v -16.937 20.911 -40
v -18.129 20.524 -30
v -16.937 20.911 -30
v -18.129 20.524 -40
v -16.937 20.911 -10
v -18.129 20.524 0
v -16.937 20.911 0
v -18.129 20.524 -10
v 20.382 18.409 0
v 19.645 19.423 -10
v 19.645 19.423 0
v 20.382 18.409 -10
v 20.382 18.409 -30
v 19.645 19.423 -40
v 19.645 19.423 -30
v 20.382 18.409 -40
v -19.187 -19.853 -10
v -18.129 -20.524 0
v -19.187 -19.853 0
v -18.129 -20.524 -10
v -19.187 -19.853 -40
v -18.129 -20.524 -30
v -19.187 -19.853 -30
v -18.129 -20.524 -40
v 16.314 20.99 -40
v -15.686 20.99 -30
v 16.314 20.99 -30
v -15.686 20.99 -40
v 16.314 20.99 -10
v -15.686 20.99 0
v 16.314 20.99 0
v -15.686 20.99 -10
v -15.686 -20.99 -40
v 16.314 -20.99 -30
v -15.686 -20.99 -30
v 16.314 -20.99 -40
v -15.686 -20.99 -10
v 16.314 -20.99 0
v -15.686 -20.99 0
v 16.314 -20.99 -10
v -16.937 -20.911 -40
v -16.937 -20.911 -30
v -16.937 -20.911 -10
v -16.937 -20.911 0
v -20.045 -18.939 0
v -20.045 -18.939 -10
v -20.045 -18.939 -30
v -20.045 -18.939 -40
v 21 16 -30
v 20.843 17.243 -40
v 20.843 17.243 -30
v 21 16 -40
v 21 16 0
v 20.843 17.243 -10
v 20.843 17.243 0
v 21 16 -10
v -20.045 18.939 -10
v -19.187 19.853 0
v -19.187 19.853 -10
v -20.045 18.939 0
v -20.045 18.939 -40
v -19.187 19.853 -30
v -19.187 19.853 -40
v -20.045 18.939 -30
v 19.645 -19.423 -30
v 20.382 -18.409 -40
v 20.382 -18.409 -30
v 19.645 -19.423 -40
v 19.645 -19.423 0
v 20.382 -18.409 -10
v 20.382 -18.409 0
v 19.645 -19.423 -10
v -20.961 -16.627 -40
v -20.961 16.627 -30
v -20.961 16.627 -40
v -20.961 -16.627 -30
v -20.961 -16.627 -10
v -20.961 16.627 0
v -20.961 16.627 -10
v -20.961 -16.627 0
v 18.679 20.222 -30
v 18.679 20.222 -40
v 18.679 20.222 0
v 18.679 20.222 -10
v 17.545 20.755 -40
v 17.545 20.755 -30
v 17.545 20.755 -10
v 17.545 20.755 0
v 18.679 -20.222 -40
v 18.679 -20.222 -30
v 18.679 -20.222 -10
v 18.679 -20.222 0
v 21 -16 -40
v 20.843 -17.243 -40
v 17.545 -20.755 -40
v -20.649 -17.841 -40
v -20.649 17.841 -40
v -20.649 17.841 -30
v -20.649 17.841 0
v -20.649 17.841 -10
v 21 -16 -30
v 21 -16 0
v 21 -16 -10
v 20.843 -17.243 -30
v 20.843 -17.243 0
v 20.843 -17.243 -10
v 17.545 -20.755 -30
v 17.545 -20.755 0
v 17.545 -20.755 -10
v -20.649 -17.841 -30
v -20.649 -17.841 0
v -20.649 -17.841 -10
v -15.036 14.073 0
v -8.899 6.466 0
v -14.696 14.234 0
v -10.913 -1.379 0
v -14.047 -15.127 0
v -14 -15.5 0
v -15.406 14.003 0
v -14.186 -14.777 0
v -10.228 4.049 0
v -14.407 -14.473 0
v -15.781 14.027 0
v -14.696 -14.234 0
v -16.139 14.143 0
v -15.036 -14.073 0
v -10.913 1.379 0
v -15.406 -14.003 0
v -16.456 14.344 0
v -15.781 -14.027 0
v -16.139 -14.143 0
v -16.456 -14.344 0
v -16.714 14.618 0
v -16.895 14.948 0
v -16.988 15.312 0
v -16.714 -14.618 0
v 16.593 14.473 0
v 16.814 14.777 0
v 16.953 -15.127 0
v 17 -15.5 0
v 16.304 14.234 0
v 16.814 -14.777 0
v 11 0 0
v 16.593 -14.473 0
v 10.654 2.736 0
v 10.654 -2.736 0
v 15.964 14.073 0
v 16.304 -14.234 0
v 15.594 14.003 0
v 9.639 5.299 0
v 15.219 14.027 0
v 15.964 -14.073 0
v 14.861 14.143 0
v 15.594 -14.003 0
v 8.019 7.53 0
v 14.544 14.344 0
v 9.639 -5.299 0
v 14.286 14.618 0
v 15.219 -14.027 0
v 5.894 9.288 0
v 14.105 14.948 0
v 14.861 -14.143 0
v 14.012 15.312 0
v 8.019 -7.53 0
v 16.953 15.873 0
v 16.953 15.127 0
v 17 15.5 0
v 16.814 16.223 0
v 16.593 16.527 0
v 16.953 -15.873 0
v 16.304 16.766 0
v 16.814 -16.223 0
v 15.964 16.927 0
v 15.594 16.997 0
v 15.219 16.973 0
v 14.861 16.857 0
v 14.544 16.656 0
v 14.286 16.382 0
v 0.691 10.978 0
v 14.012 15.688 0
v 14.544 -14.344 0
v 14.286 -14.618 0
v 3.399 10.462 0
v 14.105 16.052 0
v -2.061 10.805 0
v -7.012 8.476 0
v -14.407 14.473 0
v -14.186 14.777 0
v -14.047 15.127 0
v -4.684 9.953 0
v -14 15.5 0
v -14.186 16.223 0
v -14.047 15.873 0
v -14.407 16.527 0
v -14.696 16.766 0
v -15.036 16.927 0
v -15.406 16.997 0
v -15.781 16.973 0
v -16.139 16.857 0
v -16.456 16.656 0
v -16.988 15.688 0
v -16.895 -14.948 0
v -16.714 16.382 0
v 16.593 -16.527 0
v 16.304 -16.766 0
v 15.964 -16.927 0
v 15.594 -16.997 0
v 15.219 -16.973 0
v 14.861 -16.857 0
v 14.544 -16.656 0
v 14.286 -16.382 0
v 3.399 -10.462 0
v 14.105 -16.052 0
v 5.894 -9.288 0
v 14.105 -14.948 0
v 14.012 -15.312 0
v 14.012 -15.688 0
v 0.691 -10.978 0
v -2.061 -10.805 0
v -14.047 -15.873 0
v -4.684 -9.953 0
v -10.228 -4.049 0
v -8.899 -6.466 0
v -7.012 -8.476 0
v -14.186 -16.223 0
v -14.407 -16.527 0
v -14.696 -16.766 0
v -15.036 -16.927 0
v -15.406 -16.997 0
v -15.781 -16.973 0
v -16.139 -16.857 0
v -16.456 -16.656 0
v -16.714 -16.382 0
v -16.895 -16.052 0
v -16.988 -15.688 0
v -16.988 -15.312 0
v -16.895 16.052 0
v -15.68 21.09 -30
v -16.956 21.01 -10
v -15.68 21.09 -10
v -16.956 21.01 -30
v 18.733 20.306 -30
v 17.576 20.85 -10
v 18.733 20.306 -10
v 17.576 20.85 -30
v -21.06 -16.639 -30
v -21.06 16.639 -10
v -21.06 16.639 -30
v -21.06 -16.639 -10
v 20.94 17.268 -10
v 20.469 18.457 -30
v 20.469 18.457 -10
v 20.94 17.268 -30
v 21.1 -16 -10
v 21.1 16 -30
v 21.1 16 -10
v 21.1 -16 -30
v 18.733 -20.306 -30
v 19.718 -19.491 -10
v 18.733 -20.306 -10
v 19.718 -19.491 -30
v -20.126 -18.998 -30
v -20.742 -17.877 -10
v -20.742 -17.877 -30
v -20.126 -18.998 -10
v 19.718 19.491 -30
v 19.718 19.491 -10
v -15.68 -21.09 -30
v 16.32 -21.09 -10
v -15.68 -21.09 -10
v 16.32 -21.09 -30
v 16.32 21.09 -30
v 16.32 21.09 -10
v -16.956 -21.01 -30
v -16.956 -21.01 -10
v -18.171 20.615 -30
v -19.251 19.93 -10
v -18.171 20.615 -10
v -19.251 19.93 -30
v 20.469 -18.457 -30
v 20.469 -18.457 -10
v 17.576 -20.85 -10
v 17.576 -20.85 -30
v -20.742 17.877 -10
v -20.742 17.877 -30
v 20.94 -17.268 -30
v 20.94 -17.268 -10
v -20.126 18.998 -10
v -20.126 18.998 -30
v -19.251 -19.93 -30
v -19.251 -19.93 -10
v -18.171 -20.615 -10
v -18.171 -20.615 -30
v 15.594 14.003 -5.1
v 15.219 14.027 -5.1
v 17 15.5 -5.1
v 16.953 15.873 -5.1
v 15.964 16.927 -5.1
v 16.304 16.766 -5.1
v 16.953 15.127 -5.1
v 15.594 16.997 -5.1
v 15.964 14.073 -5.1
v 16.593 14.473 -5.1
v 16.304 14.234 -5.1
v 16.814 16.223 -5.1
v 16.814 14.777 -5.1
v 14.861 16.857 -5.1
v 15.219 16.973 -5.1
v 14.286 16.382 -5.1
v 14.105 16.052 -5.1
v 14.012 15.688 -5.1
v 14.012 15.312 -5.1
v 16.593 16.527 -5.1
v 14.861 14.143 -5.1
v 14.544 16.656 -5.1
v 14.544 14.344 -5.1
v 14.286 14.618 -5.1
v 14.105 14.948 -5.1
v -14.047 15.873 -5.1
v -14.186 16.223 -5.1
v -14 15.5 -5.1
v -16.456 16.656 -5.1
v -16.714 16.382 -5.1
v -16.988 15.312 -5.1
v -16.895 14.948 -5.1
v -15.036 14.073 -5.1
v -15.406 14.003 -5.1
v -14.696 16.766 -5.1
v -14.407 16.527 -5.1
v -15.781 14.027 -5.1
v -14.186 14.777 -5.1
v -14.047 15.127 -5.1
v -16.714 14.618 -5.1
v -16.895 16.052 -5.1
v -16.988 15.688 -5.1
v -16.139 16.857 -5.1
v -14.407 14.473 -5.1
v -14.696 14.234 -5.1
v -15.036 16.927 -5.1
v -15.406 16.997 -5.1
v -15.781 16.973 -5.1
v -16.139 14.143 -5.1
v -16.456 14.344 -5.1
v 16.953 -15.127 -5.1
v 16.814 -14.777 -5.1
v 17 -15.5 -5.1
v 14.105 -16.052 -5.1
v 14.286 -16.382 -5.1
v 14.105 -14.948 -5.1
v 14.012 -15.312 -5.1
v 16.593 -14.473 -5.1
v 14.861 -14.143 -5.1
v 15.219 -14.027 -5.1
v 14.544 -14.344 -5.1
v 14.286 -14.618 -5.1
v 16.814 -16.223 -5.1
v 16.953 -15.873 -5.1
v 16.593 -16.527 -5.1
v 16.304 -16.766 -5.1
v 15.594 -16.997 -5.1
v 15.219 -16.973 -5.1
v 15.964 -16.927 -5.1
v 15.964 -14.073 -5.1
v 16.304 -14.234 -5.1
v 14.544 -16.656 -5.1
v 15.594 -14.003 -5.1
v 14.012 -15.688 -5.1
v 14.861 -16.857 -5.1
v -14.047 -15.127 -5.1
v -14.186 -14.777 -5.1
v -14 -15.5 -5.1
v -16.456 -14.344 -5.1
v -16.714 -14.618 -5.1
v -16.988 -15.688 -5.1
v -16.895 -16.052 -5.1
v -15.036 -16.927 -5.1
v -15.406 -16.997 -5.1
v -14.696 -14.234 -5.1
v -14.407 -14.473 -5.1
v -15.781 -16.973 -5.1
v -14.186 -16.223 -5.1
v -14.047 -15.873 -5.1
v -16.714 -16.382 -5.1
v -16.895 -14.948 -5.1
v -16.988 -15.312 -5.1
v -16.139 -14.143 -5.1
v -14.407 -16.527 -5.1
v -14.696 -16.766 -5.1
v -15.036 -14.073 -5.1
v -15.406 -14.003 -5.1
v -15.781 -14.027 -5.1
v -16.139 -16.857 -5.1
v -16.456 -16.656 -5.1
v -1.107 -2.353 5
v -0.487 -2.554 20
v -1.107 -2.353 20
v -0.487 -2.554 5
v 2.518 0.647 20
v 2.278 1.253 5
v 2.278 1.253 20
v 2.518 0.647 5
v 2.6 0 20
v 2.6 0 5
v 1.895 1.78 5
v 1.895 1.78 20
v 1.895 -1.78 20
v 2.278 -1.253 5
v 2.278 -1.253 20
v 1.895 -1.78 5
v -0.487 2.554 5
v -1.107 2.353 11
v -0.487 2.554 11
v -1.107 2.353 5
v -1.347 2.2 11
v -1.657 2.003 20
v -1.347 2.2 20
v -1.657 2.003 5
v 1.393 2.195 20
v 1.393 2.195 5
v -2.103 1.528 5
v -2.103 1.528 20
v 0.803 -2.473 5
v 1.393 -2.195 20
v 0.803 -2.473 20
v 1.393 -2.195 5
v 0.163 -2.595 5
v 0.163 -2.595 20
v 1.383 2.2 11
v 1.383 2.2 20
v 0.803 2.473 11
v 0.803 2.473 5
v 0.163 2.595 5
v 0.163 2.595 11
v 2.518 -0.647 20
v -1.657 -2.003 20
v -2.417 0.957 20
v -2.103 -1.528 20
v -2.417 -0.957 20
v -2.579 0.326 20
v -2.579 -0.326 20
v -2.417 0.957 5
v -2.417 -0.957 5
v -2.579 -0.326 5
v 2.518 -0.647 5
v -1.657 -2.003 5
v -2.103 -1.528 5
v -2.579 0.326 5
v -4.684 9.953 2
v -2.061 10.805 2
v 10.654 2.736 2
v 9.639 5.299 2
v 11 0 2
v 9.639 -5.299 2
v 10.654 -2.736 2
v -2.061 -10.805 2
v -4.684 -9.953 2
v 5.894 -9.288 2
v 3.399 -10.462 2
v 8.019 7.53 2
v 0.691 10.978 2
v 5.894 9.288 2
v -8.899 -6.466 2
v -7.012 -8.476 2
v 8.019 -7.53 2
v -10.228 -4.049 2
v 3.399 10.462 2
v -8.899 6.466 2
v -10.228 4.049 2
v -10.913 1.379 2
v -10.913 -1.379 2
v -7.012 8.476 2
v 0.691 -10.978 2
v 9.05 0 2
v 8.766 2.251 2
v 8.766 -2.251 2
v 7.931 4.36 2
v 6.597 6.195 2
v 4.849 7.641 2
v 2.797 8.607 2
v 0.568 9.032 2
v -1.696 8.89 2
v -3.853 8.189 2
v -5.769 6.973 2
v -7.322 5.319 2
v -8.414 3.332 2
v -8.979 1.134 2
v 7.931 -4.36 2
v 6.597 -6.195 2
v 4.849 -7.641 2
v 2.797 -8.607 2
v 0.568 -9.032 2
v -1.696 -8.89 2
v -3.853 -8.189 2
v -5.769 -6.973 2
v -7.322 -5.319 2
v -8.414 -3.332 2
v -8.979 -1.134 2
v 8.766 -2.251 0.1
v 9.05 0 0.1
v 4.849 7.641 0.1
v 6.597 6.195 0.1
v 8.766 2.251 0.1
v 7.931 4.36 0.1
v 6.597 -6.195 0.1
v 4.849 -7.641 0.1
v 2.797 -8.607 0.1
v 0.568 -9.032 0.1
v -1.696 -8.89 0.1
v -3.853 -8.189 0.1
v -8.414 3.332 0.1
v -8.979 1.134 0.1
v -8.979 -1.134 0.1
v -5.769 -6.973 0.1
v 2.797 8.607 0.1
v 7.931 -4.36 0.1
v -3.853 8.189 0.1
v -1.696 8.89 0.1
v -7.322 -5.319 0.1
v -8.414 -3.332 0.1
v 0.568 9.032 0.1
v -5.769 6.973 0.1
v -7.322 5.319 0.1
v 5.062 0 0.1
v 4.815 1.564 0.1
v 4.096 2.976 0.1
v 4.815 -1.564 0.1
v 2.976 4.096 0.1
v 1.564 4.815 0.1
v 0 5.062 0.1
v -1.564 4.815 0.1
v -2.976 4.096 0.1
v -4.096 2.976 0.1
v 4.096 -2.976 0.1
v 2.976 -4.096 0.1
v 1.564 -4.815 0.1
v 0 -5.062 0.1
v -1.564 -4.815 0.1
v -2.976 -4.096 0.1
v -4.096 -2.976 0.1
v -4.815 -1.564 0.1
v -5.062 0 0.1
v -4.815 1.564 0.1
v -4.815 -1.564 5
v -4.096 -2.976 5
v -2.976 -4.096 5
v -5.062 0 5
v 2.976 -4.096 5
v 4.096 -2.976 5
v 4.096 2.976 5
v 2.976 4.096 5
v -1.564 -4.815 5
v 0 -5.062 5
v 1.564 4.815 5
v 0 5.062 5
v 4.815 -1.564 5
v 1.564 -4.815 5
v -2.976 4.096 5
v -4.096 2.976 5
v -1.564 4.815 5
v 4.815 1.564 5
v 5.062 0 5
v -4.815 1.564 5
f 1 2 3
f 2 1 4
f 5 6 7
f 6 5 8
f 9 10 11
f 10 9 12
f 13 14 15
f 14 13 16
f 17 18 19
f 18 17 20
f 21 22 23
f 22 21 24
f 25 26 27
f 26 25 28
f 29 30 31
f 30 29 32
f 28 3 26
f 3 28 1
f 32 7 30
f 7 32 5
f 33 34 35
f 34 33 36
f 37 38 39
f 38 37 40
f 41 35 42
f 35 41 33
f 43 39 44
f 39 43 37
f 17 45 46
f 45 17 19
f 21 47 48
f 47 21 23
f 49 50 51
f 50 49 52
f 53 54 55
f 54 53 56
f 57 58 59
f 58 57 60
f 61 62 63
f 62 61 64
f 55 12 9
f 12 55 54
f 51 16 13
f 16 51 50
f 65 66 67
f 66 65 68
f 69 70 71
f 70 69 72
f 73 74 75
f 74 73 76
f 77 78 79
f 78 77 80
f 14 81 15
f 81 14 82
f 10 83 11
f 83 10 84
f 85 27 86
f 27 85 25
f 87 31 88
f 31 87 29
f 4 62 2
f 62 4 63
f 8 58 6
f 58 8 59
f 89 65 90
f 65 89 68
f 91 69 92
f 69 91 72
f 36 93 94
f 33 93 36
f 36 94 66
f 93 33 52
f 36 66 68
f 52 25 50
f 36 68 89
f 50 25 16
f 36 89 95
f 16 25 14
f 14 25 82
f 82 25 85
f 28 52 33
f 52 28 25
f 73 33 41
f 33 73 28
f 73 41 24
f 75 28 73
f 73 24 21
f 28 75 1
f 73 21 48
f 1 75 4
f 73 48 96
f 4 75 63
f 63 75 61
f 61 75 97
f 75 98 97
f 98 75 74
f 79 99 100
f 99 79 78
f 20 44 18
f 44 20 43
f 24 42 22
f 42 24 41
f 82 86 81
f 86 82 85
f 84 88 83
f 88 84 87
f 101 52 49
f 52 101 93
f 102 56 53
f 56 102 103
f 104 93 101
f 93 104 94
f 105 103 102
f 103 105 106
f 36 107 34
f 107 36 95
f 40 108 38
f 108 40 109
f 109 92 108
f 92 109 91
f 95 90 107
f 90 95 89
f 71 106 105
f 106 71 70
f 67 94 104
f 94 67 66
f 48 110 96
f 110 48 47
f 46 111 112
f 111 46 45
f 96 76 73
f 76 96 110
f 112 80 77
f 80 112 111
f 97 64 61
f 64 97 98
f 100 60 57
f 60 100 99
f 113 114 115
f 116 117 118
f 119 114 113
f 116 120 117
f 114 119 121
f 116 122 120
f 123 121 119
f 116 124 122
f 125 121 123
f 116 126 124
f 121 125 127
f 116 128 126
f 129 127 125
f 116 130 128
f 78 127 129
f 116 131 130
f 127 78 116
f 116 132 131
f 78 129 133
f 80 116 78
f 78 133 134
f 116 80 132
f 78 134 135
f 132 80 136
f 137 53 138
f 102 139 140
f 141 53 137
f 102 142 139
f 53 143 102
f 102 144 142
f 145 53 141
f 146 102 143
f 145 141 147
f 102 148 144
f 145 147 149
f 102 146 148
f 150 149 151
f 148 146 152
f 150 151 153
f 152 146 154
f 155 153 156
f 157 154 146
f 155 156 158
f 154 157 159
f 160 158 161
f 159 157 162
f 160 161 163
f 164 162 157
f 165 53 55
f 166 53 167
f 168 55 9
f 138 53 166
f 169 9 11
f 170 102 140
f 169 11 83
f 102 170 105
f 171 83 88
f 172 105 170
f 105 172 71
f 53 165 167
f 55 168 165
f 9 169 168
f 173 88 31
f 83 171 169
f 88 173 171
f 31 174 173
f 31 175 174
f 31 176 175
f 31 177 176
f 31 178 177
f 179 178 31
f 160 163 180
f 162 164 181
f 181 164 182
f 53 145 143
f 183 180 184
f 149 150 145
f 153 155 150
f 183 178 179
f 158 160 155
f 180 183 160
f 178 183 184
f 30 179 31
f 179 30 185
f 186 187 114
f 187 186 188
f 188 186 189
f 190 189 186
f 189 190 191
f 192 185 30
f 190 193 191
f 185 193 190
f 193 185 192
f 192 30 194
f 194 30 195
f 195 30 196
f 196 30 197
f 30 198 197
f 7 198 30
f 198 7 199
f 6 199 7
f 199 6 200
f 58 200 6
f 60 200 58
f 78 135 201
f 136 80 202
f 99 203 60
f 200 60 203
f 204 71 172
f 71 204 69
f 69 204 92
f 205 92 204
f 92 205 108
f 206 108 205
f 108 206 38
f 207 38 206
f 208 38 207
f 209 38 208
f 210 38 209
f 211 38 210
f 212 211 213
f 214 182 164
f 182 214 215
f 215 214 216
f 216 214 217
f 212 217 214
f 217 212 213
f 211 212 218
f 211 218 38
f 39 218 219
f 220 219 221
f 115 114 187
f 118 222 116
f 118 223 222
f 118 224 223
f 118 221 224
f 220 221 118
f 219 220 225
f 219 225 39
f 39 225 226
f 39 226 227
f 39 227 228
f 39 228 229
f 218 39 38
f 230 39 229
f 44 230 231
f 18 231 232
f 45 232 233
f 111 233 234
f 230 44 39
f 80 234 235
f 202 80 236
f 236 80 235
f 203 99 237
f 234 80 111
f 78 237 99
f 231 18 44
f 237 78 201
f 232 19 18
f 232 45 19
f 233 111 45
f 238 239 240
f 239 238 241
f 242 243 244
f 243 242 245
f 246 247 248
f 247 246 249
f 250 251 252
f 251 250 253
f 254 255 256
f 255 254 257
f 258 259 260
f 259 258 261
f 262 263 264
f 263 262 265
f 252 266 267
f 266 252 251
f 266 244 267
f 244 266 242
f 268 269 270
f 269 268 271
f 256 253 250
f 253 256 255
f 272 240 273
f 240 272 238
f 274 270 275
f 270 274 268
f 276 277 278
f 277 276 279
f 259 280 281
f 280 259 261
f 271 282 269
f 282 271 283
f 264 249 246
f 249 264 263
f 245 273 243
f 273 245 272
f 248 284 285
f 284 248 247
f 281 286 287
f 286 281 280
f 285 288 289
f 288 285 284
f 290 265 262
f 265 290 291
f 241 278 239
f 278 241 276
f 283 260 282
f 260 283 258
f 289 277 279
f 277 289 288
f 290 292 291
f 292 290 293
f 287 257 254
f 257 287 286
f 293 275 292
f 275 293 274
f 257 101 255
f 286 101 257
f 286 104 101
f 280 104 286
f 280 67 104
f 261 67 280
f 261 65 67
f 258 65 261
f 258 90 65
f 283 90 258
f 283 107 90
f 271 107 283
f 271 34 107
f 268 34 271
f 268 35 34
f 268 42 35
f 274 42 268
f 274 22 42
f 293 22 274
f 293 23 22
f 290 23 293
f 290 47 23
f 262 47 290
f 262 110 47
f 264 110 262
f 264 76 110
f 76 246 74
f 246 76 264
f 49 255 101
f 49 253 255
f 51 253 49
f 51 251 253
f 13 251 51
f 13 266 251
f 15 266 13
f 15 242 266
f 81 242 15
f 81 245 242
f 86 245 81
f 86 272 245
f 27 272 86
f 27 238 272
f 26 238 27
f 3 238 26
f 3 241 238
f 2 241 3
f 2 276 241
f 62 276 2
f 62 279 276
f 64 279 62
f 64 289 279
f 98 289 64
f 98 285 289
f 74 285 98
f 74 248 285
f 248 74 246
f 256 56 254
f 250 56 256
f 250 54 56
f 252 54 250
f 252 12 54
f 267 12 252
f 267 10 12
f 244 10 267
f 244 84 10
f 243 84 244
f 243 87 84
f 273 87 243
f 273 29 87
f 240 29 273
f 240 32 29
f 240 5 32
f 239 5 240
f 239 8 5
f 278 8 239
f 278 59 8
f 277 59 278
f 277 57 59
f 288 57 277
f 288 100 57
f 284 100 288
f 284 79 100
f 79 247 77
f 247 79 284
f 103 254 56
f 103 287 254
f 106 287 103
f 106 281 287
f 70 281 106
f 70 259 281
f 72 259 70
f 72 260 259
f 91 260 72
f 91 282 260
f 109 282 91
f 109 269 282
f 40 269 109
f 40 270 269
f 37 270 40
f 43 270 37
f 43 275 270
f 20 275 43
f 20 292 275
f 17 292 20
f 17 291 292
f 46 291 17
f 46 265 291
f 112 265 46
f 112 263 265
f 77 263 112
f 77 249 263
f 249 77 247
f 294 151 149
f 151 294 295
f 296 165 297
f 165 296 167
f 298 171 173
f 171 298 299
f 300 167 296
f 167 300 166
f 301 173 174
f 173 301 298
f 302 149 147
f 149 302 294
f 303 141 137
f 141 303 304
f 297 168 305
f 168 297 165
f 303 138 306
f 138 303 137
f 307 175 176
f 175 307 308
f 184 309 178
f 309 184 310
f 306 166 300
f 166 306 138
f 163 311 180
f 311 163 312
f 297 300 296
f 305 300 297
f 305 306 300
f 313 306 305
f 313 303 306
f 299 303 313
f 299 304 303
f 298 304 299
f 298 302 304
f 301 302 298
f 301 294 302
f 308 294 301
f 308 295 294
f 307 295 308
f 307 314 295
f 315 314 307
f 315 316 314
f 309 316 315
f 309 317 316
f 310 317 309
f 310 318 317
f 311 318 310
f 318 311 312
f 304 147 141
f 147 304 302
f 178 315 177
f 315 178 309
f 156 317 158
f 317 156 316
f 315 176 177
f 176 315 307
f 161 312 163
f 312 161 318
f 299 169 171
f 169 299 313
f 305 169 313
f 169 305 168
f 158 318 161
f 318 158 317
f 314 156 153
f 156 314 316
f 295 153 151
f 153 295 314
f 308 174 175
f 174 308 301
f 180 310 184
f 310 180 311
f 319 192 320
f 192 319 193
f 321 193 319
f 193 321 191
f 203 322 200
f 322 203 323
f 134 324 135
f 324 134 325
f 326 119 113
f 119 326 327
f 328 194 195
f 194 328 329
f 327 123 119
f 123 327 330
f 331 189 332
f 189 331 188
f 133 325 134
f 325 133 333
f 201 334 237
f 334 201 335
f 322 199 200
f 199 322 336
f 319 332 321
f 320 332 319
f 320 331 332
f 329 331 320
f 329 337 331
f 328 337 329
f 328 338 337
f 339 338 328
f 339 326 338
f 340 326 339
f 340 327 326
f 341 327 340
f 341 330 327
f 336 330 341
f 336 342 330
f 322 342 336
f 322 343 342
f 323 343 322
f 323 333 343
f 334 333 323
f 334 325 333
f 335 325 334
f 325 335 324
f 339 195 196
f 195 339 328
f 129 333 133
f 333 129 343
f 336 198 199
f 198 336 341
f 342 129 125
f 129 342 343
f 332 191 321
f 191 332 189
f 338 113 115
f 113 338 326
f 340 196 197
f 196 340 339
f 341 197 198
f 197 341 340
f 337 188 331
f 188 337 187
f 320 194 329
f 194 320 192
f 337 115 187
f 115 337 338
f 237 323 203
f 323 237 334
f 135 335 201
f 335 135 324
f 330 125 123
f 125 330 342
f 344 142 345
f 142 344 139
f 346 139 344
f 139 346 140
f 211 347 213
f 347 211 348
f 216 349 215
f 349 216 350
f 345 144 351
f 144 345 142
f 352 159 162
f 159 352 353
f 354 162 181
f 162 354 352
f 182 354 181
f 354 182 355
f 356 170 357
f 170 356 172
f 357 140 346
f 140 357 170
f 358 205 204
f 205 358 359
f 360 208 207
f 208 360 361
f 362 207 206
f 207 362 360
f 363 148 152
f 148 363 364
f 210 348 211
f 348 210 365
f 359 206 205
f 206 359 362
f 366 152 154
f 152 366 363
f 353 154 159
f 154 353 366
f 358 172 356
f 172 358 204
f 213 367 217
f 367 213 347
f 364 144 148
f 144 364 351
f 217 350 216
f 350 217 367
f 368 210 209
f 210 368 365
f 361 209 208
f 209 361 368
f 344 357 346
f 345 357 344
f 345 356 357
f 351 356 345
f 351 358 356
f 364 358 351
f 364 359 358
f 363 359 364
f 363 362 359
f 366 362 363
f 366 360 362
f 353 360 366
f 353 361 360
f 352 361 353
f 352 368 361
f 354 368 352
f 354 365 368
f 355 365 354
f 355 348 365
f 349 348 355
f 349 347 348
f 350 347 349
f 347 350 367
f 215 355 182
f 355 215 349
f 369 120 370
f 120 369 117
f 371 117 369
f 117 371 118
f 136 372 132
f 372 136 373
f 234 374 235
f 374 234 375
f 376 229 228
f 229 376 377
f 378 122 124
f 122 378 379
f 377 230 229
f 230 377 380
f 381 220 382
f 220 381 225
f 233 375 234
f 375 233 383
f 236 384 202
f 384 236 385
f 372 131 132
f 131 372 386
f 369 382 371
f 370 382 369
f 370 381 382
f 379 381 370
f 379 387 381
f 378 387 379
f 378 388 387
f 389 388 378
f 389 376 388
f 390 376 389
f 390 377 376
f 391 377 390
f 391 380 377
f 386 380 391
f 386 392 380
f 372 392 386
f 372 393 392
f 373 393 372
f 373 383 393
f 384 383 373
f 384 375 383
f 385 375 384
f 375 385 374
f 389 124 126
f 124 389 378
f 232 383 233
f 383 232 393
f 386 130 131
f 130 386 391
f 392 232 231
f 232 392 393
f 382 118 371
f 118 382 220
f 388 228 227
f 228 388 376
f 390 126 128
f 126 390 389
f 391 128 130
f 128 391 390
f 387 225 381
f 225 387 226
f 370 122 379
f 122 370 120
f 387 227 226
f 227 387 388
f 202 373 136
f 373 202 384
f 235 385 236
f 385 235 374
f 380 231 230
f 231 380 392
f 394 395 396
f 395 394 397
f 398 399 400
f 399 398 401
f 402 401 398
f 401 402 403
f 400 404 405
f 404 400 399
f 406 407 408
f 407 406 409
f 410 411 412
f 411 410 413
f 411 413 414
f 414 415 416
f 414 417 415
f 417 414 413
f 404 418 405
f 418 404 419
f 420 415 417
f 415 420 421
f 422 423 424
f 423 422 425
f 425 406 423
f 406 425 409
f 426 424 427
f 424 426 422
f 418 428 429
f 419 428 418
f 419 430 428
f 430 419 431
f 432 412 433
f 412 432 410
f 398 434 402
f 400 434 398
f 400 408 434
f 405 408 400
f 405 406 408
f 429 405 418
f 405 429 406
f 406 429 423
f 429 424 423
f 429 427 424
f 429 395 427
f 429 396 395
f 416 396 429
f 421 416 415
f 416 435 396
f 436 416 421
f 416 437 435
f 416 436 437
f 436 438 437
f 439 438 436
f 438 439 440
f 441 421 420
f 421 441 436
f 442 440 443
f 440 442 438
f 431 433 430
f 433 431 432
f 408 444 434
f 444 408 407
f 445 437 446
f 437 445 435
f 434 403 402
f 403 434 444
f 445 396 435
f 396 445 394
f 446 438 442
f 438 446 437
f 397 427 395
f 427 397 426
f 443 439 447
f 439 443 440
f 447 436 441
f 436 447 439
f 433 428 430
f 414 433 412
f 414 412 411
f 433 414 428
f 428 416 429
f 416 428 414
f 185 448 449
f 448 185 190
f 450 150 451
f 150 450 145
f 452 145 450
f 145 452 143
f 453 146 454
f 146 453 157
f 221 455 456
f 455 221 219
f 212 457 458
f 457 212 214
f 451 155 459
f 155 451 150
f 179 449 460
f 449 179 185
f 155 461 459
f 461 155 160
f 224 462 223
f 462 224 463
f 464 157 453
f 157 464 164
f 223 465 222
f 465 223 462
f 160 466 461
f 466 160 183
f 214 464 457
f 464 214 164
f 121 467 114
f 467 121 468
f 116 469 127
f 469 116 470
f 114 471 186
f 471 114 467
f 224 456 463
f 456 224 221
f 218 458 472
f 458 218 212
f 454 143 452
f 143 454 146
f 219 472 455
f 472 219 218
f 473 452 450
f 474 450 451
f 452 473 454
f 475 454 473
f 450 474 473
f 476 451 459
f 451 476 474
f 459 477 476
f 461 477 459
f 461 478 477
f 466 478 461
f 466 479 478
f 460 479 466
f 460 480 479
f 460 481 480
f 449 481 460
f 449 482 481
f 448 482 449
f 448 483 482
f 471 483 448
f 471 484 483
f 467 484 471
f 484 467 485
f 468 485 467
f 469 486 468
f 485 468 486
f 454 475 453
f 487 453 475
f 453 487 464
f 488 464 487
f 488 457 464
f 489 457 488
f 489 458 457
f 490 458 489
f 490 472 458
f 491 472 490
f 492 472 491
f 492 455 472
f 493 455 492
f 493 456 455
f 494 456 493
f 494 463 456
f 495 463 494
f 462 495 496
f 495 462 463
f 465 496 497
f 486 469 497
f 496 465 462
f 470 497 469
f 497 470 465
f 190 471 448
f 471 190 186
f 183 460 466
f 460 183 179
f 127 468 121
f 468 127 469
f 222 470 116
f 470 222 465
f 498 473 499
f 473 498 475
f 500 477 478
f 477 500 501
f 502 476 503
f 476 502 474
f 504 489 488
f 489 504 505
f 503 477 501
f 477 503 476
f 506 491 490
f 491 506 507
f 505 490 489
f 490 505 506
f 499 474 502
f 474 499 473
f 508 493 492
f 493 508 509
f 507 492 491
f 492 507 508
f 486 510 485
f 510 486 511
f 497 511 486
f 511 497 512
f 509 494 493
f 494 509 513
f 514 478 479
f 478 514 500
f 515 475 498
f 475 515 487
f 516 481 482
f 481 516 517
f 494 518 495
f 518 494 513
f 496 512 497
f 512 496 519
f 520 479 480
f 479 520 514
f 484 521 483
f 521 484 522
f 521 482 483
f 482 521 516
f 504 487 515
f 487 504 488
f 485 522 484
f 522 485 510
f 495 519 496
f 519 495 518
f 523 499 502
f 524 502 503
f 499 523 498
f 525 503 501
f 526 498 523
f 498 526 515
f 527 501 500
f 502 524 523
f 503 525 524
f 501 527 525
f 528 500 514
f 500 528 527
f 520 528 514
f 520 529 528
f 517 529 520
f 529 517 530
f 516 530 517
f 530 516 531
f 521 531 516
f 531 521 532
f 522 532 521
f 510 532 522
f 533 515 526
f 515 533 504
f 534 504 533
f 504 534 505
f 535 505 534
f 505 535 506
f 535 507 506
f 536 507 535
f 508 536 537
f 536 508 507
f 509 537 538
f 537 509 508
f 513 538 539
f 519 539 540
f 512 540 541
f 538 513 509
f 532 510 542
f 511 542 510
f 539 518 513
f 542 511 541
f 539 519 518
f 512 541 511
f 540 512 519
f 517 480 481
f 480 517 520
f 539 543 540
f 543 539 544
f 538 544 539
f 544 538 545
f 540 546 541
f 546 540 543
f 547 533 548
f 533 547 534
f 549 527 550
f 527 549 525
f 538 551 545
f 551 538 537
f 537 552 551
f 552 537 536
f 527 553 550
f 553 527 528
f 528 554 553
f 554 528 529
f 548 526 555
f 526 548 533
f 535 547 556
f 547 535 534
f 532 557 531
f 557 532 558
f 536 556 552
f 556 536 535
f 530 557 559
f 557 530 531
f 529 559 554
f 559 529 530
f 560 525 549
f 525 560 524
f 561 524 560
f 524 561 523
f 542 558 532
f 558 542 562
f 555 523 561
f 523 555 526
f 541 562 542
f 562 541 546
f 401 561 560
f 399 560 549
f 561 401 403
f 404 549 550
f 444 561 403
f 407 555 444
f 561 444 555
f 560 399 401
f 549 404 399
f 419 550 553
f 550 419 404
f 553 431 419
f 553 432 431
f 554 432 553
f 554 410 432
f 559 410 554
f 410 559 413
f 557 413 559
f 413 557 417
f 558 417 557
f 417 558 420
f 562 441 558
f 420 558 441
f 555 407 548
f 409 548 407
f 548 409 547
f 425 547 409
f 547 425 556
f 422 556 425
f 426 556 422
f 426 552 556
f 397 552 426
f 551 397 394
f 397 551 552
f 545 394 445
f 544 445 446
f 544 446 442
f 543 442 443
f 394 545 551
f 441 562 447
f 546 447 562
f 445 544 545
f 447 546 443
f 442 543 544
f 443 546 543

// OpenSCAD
// file: cylinder_poly.scad
// Based on nophead research
module polyhole(d, h, center=false) {
    n = max(round(2 * d),3);
    rotate([0,0,180])
        cylinder(h = h, r = (d / 2) / cos (180 / n), $fn = n, center = center);
}

// make it interchangeable between this and cylinder
module cylinder_poly(r, h, center=false){
    polyhole(d=r*2, h=h, center=center);
}

cylinder_poly(5,5);
// main file
include <cylinder_poly.scad>
M3 = 3/2;

$fn=25;

module nema_17(motor_height = 40, shaft_diameter = 5.2, shaft_flat = 0.2)
{
    rotate(a=90, v=[-1,0,0])
    nema(motor_size = 42, motor_height = 40, shaft_diameter = 5.2, shaft_flat = 0.2);
}

nema_17();

module nema(motor_size=42, motor_height = 38, shaft_diameter = 5.2, shaft_flat = 0.2) {
	difference() {

    union()
    {
        color("silver")
        // Motor base
		translate([0,motor_height/2,0]) rotate([90,0,0]) hull() {
			translate([-(motor_size/2-5),(motor_size/2-5),0]) cylinder(r=5,h=motor_height, center = true);
			translate([(motor_size/2-5),(motor_size/2-5),0]) cylinder(r=5,h=motor_height, center = true);
			translate([-(motor_size/2-5),-(motor_size/2-5),0]) cylinder(r=5,h=motor_height, center = true);
			translate([(motor_size/2-5),-(motor_size/2-5),0]) cylinder(r=5,h=motor_height, center = true);
		}
        color("black")
        translate([0,motor_height/2,0]) rotate([90,0,0]) hull() {
            translate([-(motor_size/2-5),(motor_size/2-5),0]) cylinder(r=5.1,h=motor_height/2, center = true);
            translate([(motor_size/2-5),(motor_size/2-5),0]) cylinder(r=5.1,h=motor_height/2, center = true);
            translate([-(motor_size/2-5),-(motor_size/2-5),0]) cylinder(r=5.1,h=motor_height/2, center = true);
            translate([(motor_size/2-5),-(motor_size/2-5),0]) cylinder(r=5.1,h=motor_height/2, center = true);
        }
    }


        // Mount holes
        union() {
		translate([15.5,0.1,15.5]) rotate([90,0,0]) cylinder(r=1.5,h=10, center = true);
		translate([-15.5,0.1,15.5]) rotate([90,0,0]) cylinder(r=1.5,h=10, center = true);
		translate([15.5,0.1,-15.5]) rotate([90,0,0]) cylinder(r=1.5,h=10, center = true);
		translate([-15.5,0.1,-15.5]) rotate([90,0,0]) cylinder(r=1.5,h=10, center = true);
        }
	}
    color("silver")
    // Motor shaft
	translate([0,-10,0]) rotate([90,0,0])
    difference() {    
        cylinder(r=shaft_diameter/2,h=20, center = true); 
        translate([-shaft_diameter/2,(shaft_diameter/2)-shaft_flat*2,1])
        cube([shaft_diameter,shaft_diameter/2,10]);
    }
    color("gray")
    // The ring around the motor shaft
	difference() {
		translate([0,-1,0]) rotate([90,0,0]) cylinder(r=11,h=2, center = true);
		translate([0,-1.1,0]) rotate([90,0,0]) cylinder(r=9.05,h=2, center = true);
	}
}

module nema_holes(places=[1,1,1,1], size=15.5, h=10, holes=false, shadow=false, $fn=8){
    for (i=[0:3]) {
        if (places[i] == 1) {
            rotate([0, 0, 90*i]) translate([size, size, 0]) {
                if (holes) {
                    rotate([0, 0, -90*i]) translate([0,0,0]) rotate([0,0,90]) cylinder_poly(h = h+0.1, r = M3/2);
					rotate([0, 0, -90*i]) translate([0,0,h]) rotate([0,0,22.5]) cylinder(h = h, r = M3*2.2/2, $fn = $fn);
                } else {
                    rotate([0, 0, -90*i]) cylinder(h=h, r=4, $fn=$fn);
                }
            }
        }
    }
    if (shaft_cut != false) {
        translate ([0, 0, 0]) cylinder(r=22.6/2,h=h*2, center = false, $fn=20);
    }
    if (shadow != false) {
        %translate ([0, 0, -19]) cube([42,42,38], center = true);
    //flange
        translate ([0, 0, 0]) cylinder(r=22.6/2,h=h*2, center = false, $fn=20);
    //shaft
        %translate ([0, 0, 0]) cylinder(r=2.5,h=14, center = false);
    }
}
